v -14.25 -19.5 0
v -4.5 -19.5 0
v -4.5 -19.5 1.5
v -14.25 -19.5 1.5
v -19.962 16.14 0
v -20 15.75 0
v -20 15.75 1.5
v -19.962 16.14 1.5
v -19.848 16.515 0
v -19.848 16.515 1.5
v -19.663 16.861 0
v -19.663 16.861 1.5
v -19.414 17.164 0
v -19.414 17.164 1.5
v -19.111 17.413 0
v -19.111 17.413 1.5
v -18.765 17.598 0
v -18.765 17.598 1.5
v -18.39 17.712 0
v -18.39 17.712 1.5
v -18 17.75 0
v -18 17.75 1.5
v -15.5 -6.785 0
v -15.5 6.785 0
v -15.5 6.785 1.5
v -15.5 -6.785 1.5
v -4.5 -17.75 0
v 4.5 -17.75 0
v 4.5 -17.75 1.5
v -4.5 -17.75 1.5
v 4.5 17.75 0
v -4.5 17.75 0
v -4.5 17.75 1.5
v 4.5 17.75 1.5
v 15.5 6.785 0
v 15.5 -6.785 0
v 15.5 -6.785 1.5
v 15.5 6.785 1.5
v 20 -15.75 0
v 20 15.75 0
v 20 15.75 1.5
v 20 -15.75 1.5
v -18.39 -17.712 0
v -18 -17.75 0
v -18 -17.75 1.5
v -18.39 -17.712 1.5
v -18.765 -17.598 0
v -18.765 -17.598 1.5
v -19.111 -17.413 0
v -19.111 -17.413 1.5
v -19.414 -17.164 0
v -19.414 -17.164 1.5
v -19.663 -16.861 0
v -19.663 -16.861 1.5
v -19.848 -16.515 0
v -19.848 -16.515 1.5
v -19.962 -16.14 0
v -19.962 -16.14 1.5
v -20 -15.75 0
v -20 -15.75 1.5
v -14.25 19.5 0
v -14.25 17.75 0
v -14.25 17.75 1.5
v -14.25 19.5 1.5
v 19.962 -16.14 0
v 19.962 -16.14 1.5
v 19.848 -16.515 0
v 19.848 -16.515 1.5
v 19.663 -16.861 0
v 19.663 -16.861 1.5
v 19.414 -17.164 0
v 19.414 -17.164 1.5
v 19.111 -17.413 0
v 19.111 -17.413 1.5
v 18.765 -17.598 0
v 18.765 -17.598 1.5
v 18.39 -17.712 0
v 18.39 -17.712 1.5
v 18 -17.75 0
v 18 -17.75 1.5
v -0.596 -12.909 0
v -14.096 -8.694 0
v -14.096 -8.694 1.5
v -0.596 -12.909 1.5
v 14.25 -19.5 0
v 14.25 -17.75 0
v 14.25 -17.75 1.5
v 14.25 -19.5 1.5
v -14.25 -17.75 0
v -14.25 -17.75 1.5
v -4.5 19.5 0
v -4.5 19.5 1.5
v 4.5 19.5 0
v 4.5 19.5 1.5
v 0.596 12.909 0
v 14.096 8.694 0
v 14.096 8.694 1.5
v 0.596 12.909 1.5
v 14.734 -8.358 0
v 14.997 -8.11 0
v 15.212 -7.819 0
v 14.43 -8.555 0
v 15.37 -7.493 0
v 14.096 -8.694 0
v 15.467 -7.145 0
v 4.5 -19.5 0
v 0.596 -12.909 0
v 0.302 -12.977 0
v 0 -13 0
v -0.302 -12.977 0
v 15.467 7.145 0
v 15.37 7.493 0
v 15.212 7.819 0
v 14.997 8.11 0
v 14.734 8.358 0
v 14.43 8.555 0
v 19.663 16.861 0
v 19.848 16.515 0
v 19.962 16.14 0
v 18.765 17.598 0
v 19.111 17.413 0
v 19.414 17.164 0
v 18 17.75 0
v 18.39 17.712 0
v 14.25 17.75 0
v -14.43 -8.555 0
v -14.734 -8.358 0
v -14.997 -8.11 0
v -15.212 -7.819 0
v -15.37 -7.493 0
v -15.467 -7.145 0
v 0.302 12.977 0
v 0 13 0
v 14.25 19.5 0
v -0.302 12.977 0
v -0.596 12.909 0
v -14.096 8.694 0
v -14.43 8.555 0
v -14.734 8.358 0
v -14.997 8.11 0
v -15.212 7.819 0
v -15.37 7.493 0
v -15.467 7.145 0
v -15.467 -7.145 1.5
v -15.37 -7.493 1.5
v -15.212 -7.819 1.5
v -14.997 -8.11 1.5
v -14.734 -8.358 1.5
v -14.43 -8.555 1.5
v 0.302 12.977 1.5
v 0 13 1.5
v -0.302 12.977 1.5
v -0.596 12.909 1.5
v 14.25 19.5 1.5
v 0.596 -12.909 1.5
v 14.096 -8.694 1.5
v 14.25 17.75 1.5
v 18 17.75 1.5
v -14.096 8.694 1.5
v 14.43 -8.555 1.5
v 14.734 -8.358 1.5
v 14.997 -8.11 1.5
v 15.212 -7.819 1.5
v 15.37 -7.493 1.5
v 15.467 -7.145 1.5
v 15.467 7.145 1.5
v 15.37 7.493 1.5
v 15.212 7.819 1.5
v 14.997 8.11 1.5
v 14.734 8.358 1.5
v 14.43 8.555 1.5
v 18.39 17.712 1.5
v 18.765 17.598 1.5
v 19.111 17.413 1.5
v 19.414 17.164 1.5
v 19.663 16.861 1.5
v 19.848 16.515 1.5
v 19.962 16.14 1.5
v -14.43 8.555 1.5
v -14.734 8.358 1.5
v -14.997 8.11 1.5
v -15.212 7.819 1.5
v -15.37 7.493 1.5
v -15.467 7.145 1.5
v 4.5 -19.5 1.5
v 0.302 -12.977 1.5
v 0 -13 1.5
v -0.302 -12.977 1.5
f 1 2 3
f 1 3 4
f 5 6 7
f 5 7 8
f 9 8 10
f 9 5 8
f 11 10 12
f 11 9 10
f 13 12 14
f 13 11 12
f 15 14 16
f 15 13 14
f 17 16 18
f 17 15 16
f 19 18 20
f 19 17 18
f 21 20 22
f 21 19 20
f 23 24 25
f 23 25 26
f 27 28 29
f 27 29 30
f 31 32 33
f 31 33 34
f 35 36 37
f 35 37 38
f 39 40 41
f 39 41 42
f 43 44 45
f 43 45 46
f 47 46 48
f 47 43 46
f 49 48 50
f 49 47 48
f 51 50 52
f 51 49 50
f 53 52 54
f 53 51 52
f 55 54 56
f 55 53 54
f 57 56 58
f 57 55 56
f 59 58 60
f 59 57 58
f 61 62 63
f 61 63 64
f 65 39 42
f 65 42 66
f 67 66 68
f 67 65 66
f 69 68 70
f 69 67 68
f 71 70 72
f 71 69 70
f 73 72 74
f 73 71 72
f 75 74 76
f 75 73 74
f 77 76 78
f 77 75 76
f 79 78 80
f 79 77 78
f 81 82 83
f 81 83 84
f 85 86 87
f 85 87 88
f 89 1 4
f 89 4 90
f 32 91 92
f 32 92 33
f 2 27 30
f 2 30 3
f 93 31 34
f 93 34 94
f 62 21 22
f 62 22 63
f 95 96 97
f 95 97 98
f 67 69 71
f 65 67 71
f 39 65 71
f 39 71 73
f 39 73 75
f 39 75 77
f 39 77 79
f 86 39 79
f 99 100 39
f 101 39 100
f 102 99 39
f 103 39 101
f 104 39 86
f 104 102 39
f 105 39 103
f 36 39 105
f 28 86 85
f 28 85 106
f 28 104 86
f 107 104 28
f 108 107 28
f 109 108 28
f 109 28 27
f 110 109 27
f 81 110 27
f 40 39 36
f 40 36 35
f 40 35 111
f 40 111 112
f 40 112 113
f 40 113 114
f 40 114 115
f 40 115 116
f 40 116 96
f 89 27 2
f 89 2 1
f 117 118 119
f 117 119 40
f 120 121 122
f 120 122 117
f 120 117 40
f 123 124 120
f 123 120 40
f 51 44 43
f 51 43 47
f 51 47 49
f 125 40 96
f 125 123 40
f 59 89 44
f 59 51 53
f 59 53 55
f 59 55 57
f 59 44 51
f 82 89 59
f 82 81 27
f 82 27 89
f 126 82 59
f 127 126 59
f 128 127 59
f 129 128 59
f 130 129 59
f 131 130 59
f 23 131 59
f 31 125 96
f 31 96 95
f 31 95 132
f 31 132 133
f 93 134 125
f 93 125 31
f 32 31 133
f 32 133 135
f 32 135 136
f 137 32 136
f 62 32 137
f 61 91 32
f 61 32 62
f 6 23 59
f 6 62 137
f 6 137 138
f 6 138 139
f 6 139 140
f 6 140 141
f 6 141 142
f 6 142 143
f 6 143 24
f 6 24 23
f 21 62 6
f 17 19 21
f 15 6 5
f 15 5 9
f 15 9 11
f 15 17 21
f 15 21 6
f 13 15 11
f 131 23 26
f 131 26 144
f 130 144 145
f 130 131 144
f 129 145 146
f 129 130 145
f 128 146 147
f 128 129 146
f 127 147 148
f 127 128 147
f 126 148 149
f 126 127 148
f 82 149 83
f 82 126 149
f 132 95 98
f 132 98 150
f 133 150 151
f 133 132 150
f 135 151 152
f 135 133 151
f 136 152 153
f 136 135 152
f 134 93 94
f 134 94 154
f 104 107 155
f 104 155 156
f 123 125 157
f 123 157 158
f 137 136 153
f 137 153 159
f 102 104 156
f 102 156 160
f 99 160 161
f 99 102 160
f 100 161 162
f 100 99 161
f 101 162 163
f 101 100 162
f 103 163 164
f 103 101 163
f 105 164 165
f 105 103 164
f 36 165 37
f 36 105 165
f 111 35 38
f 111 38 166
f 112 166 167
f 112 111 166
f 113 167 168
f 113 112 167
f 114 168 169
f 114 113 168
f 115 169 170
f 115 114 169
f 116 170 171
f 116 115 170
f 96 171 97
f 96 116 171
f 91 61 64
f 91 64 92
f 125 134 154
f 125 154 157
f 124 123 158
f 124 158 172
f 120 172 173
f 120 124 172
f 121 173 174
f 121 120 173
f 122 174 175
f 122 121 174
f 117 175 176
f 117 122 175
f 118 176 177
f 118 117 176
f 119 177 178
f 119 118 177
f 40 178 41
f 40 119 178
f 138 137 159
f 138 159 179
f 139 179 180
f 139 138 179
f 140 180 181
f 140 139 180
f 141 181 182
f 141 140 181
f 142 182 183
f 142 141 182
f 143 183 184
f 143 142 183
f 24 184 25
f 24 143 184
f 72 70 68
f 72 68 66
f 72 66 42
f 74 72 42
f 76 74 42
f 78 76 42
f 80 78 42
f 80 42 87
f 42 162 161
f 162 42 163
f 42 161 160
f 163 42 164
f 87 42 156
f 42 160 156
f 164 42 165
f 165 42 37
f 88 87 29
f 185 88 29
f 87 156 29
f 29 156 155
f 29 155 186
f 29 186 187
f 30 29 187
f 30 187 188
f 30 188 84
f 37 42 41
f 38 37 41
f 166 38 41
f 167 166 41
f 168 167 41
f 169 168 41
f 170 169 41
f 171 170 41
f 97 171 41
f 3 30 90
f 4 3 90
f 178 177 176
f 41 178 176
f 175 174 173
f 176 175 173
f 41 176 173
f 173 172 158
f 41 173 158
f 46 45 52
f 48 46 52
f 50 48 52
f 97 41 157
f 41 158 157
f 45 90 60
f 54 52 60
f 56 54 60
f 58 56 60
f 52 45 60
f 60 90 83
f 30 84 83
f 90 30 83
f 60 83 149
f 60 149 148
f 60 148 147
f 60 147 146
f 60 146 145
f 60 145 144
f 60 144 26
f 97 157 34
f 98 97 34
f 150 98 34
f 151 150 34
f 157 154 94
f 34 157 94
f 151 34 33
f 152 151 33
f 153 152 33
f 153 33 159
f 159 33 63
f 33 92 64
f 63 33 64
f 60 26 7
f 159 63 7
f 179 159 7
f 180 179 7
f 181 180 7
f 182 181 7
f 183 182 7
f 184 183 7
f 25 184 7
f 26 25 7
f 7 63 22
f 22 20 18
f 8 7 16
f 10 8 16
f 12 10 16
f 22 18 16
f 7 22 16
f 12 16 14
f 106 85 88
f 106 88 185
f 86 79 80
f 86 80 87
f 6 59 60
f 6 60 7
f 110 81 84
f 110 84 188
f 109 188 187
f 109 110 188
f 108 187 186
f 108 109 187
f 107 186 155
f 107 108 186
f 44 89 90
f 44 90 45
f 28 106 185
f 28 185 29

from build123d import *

# Parameters (mm, degrees)
SALIENTE_EXTRUIR1_DEPTH = 1.5


with BuildPart() as part:
    # Croquis1 → Saliente-Extruir1 (new body)
    with BuildSketch(Plane(origin=(0, 0, 0), x_dir=(-1, 0, 0), z_dir=(0, 0, -1))):
        with BuildLine():
            Line((18, 17.75), (14.25, 17.75))
            Line((14.25, 17.75), (14.25, 19.5))
            Line((14.25, 19.5), (4.5, 19.5))
            Line((4.5, 19.5), (4.5, 17.75))
            Line((4.5, 17.75), (-4.5, 17.75))
            Line((-4.5, 17.75), (-4.5, 19.5))
            Line((-4.5, 19.5), (-14.25, 19.5))
            Line((-14.25, 19.5), (-14.25, 17.75))
            Line((-14.25, 17.75), (-18, 17.75))
            ThreePointArc((-18, 17.75), (-19.414213562, 17.164213562), (-20, 15.75))
            Line((-20, 15.75), (-20, -15.75))
            ThreePointArc((-20, -15.75), (-19.414213562, -17.164213562), (-18, -17.75))
            Line((-18, -17.75), (-14.25, -17.75))
            Line((-14.25, -17.75), (-14.25, -19.5))
            Line((-14.25, -19.5), (-4.5, -19.5))
            Line((-4.5, -19.5), (-4.5, -17.75))
            Line((-4.5, -17.75), (4.5, -17.75))
            Line((4.5, -17.75), (4.5, -19.5))
            Line((4.5, -19.5), (14.25, -19.5))
            Line((14.25, -19.5), (14.25, -17.75))
            Line((14.25, -17.75), (18, -17.75))
            ThreePointArc((18, -17.75), (19.414213562, -17.164213562), (20, -15.75))
            Line((20, -15.75), (20, 15.75))
            ThreePointArc((20, 15.75), (19.414213562, 17.164213562), (18, 17.75))
        make_face()
        with BuildLine():
            Line((-0.596130775, -12.909090909), (-14.096130775, -8.693594715))
            ThreePointArc((-14.096130775, -8.693594715), (-15.111251307, -7.96935368), (-15.5, -6.784503806))
            Line((-15.5, -6.784503806), (-15.5, 6.784503806))
            ThreePointArc((-15.5, 6.784503806), (-15.111251307, 7.96935368), (-14.096130775, 8.693594715))
            Line((-14.096130775, 8.693594715), (-0.596130775, 12.909090909))
            ThreePointArc((-0.596130775, 12.909090909), (0, 13), (0.596130775, 12.909090909))
            Line((0.596130775, 12.909090909), (14.096130775, 8.693594715))
            ThreePointArc((14.096130775, 8.693594715), (15.111251307, 7.96935368), (15.5, 6.784503806))
            Line((15.5, 6.784503806), (15.5, -6.784503806))
            ThreePointArc((15.5, -6.784503806), (15.111251307, -7.96935368), (14.096130775, -8.693594715))
            Line((14.096130775, -8.693594715), (0.596130775, -12.909090909))
            ThreePointArc((0.596130775, -12.909090909), (0, -13), (-0.596130775, -12.909090909))
        make_face(mode=Mode.SUBTRACT)
    extrude(amount=-SALIENTE_EXTRUIR1_DEPTH)


solid = part.part
